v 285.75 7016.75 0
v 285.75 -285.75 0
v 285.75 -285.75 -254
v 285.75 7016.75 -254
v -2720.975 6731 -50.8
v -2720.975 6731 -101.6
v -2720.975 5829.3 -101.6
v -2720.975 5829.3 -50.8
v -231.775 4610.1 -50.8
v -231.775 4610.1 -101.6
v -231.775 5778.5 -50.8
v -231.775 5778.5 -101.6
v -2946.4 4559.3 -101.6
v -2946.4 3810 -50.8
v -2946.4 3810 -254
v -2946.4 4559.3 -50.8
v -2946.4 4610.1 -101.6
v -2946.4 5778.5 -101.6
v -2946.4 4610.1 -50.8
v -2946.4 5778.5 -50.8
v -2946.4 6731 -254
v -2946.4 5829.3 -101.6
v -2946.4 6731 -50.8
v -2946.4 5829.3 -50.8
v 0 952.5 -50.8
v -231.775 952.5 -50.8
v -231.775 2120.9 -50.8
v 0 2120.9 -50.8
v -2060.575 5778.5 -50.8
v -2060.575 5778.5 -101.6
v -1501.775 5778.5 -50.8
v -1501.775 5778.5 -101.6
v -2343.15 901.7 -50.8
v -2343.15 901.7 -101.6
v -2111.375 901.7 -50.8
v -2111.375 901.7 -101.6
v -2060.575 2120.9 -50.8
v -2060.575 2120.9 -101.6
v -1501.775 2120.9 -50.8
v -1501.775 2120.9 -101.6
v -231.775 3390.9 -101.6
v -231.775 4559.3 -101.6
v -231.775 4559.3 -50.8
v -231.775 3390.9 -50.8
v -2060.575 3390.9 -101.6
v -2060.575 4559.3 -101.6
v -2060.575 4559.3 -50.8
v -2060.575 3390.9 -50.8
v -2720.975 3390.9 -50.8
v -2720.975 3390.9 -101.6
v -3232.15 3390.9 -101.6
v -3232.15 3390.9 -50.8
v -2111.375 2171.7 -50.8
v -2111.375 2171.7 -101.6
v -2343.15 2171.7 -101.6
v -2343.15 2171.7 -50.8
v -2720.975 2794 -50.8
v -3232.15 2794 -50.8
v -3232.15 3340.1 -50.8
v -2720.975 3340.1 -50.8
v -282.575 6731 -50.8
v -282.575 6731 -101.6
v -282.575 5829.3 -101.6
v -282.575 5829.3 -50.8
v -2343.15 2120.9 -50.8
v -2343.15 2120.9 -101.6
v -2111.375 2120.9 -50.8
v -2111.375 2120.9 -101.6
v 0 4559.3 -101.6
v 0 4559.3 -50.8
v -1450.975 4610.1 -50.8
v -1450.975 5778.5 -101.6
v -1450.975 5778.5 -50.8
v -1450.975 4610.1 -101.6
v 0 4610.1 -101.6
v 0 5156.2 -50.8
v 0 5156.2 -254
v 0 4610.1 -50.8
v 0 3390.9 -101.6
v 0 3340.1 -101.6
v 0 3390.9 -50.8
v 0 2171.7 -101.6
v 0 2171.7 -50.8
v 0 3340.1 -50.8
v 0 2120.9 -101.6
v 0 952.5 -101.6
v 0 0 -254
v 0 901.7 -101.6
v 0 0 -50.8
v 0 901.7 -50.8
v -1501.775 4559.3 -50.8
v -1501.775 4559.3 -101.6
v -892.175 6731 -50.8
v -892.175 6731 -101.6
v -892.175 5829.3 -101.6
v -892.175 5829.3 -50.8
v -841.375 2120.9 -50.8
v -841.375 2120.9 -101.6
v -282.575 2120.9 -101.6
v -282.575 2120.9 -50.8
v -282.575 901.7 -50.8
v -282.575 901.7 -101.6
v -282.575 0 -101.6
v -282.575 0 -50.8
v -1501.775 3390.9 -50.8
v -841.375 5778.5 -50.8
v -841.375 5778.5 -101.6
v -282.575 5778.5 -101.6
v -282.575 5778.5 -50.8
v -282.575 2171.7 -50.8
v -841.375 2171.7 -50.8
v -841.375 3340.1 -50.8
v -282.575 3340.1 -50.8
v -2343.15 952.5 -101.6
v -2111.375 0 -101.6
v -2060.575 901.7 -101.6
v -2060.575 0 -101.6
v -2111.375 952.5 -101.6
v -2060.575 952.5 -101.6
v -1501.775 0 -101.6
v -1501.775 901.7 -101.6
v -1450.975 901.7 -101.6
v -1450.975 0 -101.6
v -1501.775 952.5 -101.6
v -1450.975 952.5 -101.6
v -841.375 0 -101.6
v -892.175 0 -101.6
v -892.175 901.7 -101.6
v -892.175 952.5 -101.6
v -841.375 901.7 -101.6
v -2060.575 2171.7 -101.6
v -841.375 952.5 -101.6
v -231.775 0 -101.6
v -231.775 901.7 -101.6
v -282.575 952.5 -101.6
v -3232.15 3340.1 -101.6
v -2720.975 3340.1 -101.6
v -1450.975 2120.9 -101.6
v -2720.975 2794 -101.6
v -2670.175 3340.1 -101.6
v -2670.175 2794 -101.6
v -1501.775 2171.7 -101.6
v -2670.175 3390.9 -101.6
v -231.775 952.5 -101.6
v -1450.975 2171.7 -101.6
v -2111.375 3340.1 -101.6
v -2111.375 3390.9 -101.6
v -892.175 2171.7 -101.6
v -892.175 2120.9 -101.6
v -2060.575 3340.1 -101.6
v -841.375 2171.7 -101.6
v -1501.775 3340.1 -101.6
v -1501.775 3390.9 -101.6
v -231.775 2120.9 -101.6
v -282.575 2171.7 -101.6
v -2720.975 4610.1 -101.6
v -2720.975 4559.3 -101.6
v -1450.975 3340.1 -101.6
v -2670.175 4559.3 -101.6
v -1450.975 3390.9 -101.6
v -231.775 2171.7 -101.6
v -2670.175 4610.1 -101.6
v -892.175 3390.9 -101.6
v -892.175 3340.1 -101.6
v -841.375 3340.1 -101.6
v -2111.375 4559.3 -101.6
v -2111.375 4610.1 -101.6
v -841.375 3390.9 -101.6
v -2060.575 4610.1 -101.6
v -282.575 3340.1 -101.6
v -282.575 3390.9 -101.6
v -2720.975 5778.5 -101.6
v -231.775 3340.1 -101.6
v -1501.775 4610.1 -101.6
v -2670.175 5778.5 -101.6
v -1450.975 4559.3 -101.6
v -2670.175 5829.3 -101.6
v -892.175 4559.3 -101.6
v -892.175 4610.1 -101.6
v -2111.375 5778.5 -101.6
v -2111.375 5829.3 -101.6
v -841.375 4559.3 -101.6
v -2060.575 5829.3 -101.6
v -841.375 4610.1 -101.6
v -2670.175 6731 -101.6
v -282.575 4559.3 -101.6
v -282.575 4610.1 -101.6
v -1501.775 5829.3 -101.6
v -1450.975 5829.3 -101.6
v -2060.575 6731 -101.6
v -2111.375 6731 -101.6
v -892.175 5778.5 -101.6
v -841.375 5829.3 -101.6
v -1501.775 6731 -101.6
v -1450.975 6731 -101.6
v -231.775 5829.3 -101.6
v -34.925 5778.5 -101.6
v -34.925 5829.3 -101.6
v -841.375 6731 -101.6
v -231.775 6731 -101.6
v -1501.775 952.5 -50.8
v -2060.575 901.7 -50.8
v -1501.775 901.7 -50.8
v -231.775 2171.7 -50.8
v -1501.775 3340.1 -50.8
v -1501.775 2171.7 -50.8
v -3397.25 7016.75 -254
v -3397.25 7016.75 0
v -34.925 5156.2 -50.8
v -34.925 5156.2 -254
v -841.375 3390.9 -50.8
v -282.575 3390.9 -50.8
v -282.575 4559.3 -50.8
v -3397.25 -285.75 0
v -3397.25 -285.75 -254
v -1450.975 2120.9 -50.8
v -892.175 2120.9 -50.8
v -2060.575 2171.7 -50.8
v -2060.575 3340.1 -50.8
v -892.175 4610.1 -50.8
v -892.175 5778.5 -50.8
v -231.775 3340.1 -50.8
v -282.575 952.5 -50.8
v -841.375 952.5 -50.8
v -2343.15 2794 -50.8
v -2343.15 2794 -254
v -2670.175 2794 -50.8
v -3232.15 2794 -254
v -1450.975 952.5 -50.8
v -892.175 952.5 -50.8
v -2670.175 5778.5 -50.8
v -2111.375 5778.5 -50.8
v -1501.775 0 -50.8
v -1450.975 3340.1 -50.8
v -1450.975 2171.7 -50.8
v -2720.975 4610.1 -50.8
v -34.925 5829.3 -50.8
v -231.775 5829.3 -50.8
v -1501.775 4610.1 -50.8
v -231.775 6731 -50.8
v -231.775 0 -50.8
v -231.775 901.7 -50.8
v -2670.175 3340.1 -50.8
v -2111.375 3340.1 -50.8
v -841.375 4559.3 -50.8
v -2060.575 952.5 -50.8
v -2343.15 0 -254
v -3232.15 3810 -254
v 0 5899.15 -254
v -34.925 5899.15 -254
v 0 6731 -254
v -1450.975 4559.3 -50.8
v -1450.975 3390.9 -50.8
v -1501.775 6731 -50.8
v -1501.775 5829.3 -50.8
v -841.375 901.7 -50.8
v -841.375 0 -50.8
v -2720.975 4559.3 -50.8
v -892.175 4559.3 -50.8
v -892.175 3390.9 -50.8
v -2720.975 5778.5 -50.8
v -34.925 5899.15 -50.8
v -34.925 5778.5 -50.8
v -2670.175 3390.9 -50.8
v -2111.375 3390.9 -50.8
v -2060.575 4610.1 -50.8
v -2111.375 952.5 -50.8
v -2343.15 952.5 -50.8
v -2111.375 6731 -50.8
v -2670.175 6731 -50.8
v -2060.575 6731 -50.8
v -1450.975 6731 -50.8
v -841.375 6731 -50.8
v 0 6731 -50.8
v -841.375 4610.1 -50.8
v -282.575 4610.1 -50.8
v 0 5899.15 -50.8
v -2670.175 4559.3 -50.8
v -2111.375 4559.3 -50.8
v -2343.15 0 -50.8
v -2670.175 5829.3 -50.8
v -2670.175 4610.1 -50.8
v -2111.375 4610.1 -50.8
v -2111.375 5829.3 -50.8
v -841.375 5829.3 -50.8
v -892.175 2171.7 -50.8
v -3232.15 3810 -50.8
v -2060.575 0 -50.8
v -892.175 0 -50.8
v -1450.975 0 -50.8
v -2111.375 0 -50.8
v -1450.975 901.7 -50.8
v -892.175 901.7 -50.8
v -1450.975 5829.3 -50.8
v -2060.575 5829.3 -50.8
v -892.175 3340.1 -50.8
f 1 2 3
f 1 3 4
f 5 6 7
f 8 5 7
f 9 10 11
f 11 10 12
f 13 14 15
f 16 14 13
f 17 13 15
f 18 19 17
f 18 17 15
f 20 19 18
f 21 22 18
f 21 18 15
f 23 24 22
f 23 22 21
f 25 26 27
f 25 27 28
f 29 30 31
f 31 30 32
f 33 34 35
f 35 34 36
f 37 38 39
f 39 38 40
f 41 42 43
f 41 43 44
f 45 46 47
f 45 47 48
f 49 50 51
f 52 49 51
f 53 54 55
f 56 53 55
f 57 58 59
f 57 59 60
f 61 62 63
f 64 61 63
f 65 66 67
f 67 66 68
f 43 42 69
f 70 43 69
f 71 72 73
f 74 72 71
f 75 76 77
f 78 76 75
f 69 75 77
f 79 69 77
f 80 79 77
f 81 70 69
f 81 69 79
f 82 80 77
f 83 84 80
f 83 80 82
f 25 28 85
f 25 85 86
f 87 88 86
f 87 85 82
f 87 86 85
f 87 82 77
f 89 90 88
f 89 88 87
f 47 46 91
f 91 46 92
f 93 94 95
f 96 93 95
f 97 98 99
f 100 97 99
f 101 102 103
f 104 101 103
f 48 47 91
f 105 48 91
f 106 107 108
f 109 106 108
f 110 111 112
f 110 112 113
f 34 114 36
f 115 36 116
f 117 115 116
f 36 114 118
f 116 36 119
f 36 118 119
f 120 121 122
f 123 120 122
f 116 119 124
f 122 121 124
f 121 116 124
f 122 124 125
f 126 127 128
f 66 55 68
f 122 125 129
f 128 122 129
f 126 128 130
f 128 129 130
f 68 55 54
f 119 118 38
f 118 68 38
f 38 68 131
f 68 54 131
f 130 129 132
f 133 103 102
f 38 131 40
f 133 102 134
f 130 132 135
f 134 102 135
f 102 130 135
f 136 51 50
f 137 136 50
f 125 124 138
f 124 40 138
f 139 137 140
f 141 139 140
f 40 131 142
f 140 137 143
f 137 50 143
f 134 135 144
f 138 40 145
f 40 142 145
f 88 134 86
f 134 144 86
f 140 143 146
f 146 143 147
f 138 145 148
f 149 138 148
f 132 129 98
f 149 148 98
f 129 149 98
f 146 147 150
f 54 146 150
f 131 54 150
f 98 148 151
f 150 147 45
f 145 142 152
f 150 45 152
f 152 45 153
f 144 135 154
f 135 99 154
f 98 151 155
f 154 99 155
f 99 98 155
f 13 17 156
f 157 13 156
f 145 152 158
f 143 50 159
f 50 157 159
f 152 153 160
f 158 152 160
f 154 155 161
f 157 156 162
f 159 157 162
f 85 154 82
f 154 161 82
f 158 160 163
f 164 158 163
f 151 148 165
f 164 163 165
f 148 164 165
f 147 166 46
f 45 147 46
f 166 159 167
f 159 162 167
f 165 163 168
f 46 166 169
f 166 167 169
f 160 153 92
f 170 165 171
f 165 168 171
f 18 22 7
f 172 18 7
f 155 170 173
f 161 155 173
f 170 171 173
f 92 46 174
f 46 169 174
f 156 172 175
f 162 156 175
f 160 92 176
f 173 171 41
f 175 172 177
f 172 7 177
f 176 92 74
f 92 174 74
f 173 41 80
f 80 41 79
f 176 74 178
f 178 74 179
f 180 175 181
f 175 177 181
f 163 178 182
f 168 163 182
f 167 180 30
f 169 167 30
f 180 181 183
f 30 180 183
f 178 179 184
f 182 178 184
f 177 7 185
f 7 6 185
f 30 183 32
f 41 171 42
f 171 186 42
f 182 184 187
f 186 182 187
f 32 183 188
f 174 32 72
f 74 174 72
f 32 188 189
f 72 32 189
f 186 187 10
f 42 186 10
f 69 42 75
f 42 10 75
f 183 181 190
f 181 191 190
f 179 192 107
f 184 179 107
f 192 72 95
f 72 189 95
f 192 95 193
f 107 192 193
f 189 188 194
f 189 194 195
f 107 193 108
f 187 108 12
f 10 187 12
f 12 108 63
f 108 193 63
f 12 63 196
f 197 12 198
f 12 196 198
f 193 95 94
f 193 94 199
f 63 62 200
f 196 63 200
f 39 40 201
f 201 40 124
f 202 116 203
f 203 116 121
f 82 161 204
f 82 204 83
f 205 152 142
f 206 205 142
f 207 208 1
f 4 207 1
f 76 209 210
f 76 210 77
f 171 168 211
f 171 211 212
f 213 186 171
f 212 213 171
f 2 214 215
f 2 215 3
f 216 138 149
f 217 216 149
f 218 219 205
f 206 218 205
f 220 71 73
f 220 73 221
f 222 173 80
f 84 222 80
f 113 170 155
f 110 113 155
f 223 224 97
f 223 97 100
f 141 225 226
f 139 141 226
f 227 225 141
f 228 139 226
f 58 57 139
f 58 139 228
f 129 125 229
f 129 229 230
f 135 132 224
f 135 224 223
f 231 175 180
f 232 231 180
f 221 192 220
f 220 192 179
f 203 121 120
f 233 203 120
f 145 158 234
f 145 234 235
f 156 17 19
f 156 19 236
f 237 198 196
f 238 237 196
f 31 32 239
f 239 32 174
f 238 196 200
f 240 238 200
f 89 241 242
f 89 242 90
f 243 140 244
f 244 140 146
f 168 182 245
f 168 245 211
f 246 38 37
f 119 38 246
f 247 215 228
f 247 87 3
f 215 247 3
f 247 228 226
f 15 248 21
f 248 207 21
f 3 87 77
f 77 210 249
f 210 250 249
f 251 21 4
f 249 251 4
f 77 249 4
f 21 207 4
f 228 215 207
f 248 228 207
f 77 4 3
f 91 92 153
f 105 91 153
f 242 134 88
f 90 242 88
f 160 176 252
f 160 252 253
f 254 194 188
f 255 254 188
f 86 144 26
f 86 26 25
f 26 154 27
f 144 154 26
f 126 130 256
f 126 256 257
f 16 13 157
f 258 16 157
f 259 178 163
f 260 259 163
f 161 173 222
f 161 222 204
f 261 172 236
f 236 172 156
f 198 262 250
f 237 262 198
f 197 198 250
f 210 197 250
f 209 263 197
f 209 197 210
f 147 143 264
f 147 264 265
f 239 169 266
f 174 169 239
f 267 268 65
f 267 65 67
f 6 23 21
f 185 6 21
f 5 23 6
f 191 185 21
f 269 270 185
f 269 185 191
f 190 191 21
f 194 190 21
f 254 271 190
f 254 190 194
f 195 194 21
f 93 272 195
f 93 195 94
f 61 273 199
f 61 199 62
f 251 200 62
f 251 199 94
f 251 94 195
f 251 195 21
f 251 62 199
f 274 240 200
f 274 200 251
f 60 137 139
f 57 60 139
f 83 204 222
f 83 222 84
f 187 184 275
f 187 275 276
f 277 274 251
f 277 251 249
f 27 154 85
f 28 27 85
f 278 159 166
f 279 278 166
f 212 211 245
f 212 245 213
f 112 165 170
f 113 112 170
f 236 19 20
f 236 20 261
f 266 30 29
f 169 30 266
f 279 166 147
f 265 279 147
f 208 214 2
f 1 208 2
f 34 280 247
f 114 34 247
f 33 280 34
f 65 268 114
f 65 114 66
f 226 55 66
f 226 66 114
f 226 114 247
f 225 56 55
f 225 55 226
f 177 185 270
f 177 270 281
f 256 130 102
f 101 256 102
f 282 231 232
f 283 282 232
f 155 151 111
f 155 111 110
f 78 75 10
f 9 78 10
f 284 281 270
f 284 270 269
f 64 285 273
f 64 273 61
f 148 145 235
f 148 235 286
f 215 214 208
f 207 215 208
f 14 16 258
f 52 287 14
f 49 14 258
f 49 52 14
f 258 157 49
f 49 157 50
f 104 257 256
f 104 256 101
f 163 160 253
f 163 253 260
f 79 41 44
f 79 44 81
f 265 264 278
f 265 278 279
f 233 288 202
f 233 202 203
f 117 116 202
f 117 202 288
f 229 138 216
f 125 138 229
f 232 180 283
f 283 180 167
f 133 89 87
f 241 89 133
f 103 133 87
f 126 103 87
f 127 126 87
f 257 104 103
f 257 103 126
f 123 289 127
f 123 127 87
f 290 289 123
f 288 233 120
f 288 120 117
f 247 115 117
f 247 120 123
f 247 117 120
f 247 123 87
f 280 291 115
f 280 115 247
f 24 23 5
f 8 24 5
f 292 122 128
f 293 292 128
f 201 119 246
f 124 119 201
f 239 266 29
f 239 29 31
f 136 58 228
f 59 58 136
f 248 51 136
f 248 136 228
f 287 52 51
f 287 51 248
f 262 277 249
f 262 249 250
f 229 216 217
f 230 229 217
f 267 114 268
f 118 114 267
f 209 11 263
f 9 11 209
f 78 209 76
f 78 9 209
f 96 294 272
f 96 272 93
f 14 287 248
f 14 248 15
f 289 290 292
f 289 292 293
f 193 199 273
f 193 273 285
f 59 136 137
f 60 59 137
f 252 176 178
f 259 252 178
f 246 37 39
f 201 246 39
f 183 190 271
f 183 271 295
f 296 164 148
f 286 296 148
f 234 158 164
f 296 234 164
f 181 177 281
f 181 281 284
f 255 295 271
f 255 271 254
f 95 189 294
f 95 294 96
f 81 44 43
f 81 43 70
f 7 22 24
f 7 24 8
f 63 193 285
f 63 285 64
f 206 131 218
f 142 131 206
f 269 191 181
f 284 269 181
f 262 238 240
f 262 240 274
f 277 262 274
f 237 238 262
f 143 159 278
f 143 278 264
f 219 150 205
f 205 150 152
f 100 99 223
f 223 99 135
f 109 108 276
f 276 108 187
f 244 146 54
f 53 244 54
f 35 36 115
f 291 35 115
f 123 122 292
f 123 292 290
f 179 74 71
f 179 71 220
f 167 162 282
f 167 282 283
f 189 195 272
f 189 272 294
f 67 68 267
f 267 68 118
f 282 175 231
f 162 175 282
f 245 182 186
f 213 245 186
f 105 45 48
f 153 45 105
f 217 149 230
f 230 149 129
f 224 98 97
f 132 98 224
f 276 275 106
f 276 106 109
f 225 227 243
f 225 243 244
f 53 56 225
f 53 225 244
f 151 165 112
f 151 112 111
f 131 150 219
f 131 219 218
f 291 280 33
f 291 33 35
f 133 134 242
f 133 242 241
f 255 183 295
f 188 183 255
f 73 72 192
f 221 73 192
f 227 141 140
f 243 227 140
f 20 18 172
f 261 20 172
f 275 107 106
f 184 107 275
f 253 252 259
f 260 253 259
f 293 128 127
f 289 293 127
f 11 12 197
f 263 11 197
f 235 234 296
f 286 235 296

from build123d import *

# Parameters (mm, degrees)
F0_W     = 3683
F0_H     = 7302.5
F1_DEPTH = 254
F2_DEPTH = 101.6
F3_W     = 558.8
F3_H     = 901.7
F3_W_2   = 231.775
F3_H_2   = 1168.4
F3_W_3   = 511.175
F3_H_3   = 546.1
F3_W_4   = 225.425
F4_DEPTH = 50.8


# Not quite as in the source:
# - a feature names something its author has since deleted; it is built from what else it names


with BuildPart() as f1:
    # F0 (on Top) → F1 (new body)
    with BuildSketch(Plane.XY):
        with Locations((-1555.75, 3365.5)):
            Rectangle(F0_W, F0_H)
        Polygon((0, 5156.2), (0, 0), (-2343.15, 0), (-2343.15, 2794), (-3232.15, 2794), (-3232.15, 3810), (-2946.4, 3810), (-2946.4, 6731), (0, 6731), (0, 5899.15), (-34.925, 5899.15), (-34.925, 5156.2), align=None, mode=Mode.SUBTRACT)
    extrude(amount=-F1_DEPTH)

    # F0 (on Top) → F2 (join)
    with BuildSketch(Plane.XY):
        with Locations((-1555.75, 3365.5)):
            Rectangle(F0_W, F0_H)
        Polygon((0, 5156.2), (0, 0), (-2343.15, 0), (-2343.15, 2794), (-3232.15, 2794), (-3232.15, 3810), (-2946.4, 3810), (-2946.4, 6731), (0, 6731), (0, 5899.15), (-34.925, 5899.15), (-34.925, 5156.2), align=None, mode=Mode.SUBTRACT)
        Polygon((-2343.15, 0), (0, 0), (0, 5156.2), (-34.925, 5156.2), (-34.925, 5899.15), (0, 5899.15), (0, 6731), (-2946.4, 6731), (-2946.4, 3810), (-3232.15, 3810), (-3232.15, 2794), (-2343.15, 2794), align=None)
    extrude(amount=-F2_DEPTH)

    # F3 (on face) → F4 (cut)
    with BuildSketch(Plane(origin=(0, 0, -101.6), x_dir=(1, 0, 0), z_dir=(0, 0, -1))):
        with Locations((-1781.175, -450.85)):
            Rectangle(F3_W, F3_H)
        with Locations((-1171.575, -450.85)):
            Rectangle(F3_W, F3_H)
        with Locations((-561.975, -450.85)):
            Rectangle(F3_W, F3_H)
        with Locations((-115.8875, -450.85)):
            Rectangle(F3_W_2, F3_H)
        with Locations((-115.8875, -1536.7)):
            Rectangle(F3_W_2, F3_H_2)
        Polygon((-2111.375, -2171.7), (-2343.15, -2171.7), (-2343.15, -2794), (-2670.175, -2794), (-2670.175, -3340.1), (-2111.375, -3340.1), align=None)
        with Locations((-2976.5625, -3067.05)):
            Rectangle(F3_W_3, F3_H_3)
        with Locations((-115.8875, -3975.1)):
            Rectangle(F3_W_2, F3_H_2)
        with Locations((-2833.6875, -5194.3)):
            Rectangle(F3_W_4, F3_H_2)
        with Locations((-2227.2625, -450.85)):
            Rectangle(F3_W_2, F3_H)
        with Locations((-2227.2625, -1536.7)):
            Rectangle(F3_W_2, F3_H_2)
        with Locations((-1781.175, -1536.7)):
            Rectangle(F3_W, F3_H_2)
        with Locations((-1171.575, -1536.7)):
            Rectangle(F3_W, F3_H_2)
        with Locations((-561.975, -1536.7)):
            Rectangle(F3_W, F3_H_2)
        with Locations((-1781.175, -2755.9)):
            Rectangle(F3_W, F3_H_2)
        with Locations((-1171.575, -2755.9)):
            Rectangle(F3_W, F3_H_2)
        with Locations((-561.975, -2755.9)):
            Rectangle(F3_W, F3_H_2)
        with Locations((-115.8875, -2755.9)):
            Rectangle(F3_W_2, F3_H_2)
        Polygon((-2720.975, -3390.9), (-3232.15, -3390.9), (-3232.15, -3810), (-2946.4, -3810), (-2946.4, -4559.3), (-2720.975, -4559.3), align=None)
        with Locations((-2390.775, -3975.1)):
            Rectangle(F3_W, F3_H_2)
        with Locations((-1781.175, -3975.1)):
            Rectangle(F3_W, F3_H_2)
        with Locations((-1171.575, -3975.1)):
            Rectangle(F3_W, F3_H_2)
        with Locations((-561.975, -3975.1)):
            Rectangle(F3_W, F3_H_2)
        with Locations((-2390.775, -5194.3)):
            Rectangle(F3_W, F3_H_2)
        with Locations((-1781.175, -5194.3)):
            Rectangle(F3_W, F3_H_2)
        with Locations((-1171.575, -5194.3)):
            Rectangle(F3_W, F3_H_2)
        with Locations((-561.975, -5194.3)):
            Rectangle(F3_W, F3_H_2)
        Polygon((0, -5156.2), (0, -4610.1), (-231.775, -4610.1), (-231.775, -5778.5), (-34.925, -5778.5), (-34.925, -5156.2), align=None)
        with Locations((-2833.6875, -6280.15)):
            Rectangle(F3_W_4, F3_H)
        with Locations((-2390.775, -6280.15)):
            Rectangle(F3_W, F3_H)
        with Locations((-1781.175, -6280.15)):
            Rectangle(F3_W, F3_H)
        with Locations((-1171.575, -6280.15)):
            Rectangle(F3_W, F3_H)
        with Locations((-561.975, -6280.15)):
            Rectangle(F3_W, F3_H)
        Polygon((-34.925, -5899.15), (-34.925, -5829.3), (-231.775, -5829.3), (-231.775, -6731), (0, -6731), (0, -5899.15), align=None)
    extrude(amount=-F4_DEPTH, mode=Mode.SUBTRACT)


solid = f1.part
